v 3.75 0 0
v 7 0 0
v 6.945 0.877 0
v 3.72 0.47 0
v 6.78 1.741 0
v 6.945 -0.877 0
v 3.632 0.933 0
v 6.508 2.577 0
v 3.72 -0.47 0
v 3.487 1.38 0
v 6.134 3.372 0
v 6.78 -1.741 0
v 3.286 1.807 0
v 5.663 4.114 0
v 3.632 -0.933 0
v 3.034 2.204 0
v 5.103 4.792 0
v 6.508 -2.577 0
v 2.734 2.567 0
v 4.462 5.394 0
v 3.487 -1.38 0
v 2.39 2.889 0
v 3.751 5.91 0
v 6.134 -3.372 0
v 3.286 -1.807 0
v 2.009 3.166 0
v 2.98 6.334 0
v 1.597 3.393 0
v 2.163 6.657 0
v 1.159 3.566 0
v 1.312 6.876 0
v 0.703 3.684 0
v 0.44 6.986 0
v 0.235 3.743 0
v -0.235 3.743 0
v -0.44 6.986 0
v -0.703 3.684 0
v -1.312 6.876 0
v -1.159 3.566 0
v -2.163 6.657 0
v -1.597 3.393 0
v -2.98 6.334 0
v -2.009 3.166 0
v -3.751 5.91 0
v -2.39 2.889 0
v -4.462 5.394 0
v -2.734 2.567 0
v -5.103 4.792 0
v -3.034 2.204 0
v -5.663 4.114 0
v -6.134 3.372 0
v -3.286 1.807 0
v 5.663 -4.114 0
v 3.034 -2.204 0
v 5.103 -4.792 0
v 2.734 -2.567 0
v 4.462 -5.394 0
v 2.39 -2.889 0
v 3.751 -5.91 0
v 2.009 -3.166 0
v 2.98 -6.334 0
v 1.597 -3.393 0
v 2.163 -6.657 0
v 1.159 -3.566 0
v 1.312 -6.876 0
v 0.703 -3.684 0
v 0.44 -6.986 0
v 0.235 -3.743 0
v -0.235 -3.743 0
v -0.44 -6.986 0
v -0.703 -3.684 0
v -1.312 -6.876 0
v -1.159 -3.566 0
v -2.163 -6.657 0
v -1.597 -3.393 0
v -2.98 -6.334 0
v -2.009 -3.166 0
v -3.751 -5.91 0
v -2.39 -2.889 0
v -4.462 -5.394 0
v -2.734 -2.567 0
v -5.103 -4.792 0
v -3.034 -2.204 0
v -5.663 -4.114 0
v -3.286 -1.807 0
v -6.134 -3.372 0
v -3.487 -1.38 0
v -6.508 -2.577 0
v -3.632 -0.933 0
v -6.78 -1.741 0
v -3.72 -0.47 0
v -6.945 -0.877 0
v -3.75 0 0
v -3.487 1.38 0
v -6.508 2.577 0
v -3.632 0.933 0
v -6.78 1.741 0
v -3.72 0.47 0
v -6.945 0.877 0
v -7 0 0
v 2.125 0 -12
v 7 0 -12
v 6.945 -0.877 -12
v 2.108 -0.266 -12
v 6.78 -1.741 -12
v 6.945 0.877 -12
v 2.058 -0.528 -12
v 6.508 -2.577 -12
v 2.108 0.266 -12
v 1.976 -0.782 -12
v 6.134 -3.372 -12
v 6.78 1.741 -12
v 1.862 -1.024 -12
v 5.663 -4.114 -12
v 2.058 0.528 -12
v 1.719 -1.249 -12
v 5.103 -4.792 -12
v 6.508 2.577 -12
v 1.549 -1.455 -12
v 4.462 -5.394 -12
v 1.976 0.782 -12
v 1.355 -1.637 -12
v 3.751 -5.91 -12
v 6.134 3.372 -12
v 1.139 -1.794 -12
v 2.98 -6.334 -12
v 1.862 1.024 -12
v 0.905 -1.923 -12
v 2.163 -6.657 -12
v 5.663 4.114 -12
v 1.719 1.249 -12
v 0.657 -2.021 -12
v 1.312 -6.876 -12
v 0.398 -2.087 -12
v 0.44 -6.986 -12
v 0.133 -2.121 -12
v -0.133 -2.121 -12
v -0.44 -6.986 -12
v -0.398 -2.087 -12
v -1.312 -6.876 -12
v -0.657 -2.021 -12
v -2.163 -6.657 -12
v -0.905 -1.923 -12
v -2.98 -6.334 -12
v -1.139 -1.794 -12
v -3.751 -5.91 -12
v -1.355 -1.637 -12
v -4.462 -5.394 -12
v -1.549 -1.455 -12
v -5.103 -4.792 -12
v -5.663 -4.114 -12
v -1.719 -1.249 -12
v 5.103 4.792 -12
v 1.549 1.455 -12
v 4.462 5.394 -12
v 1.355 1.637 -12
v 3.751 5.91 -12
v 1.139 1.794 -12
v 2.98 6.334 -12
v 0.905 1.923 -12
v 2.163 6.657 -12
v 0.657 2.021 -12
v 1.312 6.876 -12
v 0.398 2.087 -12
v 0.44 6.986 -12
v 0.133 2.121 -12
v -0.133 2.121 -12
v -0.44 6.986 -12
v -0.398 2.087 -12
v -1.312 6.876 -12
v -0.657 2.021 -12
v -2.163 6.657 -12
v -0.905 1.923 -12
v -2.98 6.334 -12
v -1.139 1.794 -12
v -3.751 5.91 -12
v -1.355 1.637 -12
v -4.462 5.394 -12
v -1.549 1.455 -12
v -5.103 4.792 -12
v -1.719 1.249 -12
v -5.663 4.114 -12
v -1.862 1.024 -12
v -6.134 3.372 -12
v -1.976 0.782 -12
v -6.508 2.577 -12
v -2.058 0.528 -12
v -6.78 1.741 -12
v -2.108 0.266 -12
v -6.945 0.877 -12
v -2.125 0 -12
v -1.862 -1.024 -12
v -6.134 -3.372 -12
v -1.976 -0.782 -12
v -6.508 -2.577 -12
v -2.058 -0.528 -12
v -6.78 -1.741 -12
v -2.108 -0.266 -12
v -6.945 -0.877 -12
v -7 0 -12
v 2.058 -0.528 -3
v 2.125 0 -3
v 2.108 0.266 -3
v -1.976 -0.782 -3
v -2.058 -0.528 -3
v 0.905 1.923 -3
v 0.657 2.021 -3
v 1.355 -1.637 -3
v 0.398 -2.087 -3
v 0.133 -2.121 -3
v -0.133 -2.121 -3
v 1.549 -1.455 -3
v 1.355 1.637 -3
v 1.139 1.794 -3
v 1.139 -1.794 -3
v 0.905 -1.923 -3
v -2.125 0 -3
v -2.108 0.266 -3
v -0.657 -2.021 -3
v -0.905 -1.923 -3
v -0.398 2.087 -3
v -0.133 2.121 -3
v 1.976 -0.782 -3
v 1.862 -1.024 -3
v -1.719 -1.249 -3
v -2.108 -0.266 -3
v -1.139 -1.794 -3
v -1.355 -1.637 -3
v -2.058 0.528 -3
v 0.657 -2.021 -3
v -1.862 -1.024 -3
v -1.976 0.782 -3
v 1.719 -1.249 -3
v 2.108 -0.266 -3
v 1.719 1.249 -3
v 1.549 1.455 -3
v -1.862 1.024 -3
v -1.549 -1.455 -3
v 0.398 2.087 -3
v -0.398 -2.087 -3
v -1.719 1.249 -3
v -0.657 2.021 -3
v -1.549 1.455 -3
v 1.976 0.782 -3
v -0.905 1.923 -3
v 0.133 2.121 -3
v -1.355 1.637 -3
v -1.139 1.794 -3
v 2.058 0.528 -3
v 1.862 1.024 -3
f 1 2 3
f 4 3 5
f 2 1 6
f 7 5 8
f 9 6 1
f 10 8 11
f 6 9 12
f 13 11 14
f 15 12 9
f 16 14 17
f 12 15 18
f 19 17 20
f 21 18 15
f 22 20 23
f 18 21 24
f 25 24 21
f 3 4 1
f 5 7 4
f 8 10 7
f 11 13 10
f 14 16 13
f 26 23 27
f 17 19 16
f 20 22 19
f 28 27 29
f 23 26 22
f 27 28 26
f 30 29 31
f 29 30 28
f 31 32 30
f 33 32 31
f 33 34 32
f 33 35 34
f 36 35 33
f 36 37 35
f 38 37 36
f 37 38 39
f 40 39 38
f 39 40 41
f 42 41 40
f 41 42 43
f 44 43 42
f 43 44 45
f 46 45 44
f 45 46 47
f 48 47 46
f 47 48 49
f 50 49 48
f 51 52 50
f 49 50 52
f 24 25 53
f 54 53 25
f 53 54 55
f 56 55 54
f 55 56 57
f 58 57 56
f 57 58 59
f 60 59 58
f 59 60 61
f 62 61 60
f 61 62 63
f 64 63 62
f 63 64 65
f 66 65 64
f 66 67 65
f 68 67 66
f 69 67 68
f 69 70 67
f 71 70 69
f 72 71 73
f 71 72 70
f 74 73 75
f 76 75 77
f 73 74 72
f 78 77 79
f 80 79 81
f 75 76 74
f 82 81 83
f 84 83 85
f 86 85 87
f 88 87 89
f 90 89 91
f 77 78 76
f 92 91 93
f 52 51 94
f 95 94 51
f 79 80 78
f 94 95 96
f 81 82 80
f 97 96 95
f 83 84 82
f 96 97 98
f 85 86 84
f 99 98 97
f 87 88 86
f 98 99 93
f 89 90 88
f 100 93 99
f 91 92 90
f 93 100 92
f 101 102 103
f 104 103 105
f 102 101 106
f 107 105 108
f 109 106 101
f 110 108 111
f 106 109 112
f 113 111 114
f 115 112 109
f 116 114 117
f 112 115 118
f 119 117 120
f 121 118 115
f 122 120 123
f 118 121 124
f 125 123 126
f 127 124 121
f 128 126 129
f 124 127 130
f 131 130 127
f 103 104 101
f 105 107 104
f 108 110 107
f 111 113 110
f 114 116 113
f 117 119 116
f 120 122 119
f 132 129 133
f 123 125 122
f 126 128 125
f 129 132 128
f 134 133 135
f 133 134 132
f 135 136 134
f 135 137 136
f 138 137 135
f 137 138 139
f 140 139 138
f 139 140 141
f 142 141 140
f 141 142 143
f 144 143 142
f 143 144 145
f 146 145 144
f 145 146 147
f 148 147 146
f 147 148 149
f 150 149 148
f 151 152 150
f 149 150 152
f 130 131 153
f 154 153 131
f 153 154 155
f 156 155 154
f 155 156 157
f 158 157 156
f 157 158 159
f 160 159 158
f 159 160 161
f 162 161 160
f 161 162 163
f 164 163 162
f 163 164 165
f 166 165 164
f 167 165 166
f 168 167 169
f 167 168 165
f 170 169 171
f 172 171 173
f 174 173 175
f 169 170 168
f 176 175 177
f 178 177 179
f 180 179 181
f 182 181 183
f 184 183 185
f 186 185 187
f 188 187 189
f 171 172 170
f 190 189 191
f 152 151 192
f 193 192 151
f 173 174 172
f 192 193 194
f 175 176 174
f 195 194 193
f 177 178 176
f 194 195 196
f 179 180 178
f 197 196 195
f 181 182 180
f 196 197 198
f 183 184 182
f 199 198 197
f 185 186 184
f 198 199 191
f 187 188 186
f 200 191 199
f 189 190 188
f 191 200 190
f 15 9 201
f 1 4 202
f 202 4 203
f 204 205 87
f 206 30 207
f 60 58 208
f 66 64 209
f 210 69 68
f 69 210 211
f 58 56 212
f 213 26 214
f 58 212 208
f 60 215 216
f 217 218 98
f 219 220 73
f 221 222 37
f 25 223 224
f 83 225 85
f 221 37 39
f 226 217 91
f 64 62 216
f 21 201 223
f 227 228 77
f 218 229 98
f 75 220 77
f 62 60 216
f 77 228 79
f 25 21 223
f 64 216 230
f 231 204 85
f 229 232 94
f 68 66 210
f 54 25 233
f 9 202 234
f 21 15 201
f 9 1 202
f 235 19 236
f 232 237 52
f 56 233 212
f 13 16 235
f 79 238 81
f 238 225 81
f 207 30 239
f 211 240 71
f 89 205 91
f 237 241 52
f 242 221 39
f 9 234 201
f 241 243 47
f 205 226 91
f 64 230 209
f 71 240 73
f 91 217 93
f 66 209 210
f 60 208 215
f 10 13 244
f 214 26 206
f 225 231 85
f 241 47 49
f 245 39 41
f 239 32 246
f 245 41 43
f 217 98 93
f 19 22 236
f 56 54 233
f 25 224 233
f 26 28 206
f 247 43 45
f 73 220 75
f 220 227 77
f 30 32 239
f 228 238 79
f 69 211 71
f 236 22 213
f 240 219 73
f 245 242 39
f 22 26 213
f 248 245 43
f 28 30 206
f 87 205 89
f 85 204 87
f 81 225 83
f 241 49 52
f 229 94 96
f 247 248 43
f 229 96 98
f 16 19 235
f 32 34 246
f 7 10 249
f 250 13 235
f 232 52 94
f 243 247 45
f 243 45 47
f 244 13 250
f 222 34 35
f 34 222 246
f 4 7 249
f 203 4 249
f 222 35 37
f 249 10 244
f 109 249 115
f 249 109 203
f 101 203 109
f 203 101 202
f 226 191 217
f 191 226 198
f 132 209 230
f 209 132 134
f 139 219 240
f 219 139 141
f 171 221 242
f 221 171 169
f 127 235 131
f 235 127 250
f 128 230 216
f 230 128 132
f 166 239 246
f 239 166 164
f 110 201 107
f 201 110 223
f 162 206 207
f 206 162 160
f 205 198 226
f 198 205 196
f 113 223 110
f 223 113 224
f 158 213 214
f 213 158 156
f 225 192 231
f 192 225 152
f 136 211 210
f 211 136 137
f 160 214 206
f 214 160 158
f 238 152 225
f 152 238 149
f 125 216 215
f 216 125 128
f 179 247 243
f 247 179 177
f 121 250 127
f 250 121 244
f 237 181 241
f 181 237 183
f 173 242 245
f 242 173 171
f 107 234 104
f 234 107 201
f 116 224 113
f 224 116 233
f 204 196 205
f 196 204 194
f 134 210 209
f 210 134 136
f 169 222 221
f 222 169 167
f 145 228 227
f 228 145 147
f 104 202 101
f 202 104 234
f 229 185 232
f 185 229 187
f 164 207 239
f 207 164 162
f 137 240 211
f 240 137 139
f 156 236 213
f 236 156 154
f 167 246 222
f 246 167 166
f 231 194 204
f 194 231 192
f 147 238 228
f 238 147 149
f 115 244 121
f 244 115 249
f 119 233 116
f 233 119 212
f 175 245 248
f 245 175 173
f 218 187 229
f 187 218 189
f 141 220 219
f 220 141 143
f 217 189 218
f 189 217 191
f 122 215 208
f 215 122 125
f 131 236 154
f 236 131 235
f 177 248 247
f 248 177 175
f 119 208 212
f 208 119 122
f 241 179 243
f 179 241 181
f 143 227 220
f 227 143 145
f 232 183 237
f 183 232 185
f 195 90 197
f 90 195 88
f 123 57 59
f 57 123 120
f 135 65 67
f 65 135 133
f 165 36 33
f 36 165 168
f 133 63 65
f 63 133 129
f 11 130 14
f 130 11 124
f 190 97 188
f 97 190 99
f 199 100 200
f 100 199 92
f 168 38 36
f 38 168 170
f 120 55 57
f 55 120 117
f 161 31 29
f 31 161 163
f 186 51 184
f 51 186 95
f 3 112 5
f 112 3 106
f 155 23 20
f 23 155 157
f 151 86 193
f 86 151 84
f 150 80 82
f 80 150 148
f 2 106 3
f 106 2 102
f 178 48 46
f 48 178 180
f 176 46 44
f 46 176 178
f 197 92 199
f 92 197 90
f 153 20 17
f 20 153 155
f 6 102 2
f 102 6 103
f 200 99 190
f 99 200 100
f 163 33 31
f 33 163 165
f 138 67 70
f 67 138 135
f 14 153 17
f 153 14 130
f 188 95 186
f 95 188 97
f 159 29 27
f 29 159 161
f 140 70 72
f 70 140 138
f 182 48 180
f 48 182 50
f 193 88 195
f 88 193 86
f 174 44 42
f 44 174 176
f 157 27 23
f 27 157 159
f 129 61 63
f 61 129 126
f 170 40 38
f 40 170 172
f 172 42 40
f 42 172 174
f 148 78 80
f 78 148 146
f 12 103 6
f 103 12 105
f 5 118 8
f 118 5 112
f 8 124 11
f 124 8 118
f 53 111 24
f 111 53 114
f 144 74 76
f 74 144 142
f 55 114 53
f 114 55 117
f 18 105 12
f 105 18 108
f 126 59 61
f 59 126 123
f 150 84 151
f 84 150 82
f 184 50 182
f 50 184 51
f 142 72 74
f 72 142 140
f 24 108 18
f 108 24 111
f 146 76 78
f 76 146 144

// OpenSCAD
$fn = 50;


difference() {
	union() {
		translate(v = [0, 0, -12.0000000000]) {
			cylinder(h = 12, r = 7.0000000000);
		}
	}
	union() {
		translate(v = [0, 0, 0]) {
			rotate(a = [0, 0, 0]) {
				difference() {
					union() {
						#translate(v = [0, 0, -12.0000000000]) {
							cylinder(h = 12, r = 2.0000000000);
						}
						#translate(v = [0, 0, -3]) {
							cylinder(h = 3, r = 7.0000000000, r1 = 2.1250000000, r2 = 3.7500000000);
						}
						#translate(v = [0, 0, -12.0000000000]) {
							cylinder(h = 12, r = 2.1250000000);
						}
						#translate(v = [0, 0, -12.0000000000]) {
							cylinder(h = 12, r = 2.0000000000);
						}
					}
					union();
				}
			}
		}
	}
}
